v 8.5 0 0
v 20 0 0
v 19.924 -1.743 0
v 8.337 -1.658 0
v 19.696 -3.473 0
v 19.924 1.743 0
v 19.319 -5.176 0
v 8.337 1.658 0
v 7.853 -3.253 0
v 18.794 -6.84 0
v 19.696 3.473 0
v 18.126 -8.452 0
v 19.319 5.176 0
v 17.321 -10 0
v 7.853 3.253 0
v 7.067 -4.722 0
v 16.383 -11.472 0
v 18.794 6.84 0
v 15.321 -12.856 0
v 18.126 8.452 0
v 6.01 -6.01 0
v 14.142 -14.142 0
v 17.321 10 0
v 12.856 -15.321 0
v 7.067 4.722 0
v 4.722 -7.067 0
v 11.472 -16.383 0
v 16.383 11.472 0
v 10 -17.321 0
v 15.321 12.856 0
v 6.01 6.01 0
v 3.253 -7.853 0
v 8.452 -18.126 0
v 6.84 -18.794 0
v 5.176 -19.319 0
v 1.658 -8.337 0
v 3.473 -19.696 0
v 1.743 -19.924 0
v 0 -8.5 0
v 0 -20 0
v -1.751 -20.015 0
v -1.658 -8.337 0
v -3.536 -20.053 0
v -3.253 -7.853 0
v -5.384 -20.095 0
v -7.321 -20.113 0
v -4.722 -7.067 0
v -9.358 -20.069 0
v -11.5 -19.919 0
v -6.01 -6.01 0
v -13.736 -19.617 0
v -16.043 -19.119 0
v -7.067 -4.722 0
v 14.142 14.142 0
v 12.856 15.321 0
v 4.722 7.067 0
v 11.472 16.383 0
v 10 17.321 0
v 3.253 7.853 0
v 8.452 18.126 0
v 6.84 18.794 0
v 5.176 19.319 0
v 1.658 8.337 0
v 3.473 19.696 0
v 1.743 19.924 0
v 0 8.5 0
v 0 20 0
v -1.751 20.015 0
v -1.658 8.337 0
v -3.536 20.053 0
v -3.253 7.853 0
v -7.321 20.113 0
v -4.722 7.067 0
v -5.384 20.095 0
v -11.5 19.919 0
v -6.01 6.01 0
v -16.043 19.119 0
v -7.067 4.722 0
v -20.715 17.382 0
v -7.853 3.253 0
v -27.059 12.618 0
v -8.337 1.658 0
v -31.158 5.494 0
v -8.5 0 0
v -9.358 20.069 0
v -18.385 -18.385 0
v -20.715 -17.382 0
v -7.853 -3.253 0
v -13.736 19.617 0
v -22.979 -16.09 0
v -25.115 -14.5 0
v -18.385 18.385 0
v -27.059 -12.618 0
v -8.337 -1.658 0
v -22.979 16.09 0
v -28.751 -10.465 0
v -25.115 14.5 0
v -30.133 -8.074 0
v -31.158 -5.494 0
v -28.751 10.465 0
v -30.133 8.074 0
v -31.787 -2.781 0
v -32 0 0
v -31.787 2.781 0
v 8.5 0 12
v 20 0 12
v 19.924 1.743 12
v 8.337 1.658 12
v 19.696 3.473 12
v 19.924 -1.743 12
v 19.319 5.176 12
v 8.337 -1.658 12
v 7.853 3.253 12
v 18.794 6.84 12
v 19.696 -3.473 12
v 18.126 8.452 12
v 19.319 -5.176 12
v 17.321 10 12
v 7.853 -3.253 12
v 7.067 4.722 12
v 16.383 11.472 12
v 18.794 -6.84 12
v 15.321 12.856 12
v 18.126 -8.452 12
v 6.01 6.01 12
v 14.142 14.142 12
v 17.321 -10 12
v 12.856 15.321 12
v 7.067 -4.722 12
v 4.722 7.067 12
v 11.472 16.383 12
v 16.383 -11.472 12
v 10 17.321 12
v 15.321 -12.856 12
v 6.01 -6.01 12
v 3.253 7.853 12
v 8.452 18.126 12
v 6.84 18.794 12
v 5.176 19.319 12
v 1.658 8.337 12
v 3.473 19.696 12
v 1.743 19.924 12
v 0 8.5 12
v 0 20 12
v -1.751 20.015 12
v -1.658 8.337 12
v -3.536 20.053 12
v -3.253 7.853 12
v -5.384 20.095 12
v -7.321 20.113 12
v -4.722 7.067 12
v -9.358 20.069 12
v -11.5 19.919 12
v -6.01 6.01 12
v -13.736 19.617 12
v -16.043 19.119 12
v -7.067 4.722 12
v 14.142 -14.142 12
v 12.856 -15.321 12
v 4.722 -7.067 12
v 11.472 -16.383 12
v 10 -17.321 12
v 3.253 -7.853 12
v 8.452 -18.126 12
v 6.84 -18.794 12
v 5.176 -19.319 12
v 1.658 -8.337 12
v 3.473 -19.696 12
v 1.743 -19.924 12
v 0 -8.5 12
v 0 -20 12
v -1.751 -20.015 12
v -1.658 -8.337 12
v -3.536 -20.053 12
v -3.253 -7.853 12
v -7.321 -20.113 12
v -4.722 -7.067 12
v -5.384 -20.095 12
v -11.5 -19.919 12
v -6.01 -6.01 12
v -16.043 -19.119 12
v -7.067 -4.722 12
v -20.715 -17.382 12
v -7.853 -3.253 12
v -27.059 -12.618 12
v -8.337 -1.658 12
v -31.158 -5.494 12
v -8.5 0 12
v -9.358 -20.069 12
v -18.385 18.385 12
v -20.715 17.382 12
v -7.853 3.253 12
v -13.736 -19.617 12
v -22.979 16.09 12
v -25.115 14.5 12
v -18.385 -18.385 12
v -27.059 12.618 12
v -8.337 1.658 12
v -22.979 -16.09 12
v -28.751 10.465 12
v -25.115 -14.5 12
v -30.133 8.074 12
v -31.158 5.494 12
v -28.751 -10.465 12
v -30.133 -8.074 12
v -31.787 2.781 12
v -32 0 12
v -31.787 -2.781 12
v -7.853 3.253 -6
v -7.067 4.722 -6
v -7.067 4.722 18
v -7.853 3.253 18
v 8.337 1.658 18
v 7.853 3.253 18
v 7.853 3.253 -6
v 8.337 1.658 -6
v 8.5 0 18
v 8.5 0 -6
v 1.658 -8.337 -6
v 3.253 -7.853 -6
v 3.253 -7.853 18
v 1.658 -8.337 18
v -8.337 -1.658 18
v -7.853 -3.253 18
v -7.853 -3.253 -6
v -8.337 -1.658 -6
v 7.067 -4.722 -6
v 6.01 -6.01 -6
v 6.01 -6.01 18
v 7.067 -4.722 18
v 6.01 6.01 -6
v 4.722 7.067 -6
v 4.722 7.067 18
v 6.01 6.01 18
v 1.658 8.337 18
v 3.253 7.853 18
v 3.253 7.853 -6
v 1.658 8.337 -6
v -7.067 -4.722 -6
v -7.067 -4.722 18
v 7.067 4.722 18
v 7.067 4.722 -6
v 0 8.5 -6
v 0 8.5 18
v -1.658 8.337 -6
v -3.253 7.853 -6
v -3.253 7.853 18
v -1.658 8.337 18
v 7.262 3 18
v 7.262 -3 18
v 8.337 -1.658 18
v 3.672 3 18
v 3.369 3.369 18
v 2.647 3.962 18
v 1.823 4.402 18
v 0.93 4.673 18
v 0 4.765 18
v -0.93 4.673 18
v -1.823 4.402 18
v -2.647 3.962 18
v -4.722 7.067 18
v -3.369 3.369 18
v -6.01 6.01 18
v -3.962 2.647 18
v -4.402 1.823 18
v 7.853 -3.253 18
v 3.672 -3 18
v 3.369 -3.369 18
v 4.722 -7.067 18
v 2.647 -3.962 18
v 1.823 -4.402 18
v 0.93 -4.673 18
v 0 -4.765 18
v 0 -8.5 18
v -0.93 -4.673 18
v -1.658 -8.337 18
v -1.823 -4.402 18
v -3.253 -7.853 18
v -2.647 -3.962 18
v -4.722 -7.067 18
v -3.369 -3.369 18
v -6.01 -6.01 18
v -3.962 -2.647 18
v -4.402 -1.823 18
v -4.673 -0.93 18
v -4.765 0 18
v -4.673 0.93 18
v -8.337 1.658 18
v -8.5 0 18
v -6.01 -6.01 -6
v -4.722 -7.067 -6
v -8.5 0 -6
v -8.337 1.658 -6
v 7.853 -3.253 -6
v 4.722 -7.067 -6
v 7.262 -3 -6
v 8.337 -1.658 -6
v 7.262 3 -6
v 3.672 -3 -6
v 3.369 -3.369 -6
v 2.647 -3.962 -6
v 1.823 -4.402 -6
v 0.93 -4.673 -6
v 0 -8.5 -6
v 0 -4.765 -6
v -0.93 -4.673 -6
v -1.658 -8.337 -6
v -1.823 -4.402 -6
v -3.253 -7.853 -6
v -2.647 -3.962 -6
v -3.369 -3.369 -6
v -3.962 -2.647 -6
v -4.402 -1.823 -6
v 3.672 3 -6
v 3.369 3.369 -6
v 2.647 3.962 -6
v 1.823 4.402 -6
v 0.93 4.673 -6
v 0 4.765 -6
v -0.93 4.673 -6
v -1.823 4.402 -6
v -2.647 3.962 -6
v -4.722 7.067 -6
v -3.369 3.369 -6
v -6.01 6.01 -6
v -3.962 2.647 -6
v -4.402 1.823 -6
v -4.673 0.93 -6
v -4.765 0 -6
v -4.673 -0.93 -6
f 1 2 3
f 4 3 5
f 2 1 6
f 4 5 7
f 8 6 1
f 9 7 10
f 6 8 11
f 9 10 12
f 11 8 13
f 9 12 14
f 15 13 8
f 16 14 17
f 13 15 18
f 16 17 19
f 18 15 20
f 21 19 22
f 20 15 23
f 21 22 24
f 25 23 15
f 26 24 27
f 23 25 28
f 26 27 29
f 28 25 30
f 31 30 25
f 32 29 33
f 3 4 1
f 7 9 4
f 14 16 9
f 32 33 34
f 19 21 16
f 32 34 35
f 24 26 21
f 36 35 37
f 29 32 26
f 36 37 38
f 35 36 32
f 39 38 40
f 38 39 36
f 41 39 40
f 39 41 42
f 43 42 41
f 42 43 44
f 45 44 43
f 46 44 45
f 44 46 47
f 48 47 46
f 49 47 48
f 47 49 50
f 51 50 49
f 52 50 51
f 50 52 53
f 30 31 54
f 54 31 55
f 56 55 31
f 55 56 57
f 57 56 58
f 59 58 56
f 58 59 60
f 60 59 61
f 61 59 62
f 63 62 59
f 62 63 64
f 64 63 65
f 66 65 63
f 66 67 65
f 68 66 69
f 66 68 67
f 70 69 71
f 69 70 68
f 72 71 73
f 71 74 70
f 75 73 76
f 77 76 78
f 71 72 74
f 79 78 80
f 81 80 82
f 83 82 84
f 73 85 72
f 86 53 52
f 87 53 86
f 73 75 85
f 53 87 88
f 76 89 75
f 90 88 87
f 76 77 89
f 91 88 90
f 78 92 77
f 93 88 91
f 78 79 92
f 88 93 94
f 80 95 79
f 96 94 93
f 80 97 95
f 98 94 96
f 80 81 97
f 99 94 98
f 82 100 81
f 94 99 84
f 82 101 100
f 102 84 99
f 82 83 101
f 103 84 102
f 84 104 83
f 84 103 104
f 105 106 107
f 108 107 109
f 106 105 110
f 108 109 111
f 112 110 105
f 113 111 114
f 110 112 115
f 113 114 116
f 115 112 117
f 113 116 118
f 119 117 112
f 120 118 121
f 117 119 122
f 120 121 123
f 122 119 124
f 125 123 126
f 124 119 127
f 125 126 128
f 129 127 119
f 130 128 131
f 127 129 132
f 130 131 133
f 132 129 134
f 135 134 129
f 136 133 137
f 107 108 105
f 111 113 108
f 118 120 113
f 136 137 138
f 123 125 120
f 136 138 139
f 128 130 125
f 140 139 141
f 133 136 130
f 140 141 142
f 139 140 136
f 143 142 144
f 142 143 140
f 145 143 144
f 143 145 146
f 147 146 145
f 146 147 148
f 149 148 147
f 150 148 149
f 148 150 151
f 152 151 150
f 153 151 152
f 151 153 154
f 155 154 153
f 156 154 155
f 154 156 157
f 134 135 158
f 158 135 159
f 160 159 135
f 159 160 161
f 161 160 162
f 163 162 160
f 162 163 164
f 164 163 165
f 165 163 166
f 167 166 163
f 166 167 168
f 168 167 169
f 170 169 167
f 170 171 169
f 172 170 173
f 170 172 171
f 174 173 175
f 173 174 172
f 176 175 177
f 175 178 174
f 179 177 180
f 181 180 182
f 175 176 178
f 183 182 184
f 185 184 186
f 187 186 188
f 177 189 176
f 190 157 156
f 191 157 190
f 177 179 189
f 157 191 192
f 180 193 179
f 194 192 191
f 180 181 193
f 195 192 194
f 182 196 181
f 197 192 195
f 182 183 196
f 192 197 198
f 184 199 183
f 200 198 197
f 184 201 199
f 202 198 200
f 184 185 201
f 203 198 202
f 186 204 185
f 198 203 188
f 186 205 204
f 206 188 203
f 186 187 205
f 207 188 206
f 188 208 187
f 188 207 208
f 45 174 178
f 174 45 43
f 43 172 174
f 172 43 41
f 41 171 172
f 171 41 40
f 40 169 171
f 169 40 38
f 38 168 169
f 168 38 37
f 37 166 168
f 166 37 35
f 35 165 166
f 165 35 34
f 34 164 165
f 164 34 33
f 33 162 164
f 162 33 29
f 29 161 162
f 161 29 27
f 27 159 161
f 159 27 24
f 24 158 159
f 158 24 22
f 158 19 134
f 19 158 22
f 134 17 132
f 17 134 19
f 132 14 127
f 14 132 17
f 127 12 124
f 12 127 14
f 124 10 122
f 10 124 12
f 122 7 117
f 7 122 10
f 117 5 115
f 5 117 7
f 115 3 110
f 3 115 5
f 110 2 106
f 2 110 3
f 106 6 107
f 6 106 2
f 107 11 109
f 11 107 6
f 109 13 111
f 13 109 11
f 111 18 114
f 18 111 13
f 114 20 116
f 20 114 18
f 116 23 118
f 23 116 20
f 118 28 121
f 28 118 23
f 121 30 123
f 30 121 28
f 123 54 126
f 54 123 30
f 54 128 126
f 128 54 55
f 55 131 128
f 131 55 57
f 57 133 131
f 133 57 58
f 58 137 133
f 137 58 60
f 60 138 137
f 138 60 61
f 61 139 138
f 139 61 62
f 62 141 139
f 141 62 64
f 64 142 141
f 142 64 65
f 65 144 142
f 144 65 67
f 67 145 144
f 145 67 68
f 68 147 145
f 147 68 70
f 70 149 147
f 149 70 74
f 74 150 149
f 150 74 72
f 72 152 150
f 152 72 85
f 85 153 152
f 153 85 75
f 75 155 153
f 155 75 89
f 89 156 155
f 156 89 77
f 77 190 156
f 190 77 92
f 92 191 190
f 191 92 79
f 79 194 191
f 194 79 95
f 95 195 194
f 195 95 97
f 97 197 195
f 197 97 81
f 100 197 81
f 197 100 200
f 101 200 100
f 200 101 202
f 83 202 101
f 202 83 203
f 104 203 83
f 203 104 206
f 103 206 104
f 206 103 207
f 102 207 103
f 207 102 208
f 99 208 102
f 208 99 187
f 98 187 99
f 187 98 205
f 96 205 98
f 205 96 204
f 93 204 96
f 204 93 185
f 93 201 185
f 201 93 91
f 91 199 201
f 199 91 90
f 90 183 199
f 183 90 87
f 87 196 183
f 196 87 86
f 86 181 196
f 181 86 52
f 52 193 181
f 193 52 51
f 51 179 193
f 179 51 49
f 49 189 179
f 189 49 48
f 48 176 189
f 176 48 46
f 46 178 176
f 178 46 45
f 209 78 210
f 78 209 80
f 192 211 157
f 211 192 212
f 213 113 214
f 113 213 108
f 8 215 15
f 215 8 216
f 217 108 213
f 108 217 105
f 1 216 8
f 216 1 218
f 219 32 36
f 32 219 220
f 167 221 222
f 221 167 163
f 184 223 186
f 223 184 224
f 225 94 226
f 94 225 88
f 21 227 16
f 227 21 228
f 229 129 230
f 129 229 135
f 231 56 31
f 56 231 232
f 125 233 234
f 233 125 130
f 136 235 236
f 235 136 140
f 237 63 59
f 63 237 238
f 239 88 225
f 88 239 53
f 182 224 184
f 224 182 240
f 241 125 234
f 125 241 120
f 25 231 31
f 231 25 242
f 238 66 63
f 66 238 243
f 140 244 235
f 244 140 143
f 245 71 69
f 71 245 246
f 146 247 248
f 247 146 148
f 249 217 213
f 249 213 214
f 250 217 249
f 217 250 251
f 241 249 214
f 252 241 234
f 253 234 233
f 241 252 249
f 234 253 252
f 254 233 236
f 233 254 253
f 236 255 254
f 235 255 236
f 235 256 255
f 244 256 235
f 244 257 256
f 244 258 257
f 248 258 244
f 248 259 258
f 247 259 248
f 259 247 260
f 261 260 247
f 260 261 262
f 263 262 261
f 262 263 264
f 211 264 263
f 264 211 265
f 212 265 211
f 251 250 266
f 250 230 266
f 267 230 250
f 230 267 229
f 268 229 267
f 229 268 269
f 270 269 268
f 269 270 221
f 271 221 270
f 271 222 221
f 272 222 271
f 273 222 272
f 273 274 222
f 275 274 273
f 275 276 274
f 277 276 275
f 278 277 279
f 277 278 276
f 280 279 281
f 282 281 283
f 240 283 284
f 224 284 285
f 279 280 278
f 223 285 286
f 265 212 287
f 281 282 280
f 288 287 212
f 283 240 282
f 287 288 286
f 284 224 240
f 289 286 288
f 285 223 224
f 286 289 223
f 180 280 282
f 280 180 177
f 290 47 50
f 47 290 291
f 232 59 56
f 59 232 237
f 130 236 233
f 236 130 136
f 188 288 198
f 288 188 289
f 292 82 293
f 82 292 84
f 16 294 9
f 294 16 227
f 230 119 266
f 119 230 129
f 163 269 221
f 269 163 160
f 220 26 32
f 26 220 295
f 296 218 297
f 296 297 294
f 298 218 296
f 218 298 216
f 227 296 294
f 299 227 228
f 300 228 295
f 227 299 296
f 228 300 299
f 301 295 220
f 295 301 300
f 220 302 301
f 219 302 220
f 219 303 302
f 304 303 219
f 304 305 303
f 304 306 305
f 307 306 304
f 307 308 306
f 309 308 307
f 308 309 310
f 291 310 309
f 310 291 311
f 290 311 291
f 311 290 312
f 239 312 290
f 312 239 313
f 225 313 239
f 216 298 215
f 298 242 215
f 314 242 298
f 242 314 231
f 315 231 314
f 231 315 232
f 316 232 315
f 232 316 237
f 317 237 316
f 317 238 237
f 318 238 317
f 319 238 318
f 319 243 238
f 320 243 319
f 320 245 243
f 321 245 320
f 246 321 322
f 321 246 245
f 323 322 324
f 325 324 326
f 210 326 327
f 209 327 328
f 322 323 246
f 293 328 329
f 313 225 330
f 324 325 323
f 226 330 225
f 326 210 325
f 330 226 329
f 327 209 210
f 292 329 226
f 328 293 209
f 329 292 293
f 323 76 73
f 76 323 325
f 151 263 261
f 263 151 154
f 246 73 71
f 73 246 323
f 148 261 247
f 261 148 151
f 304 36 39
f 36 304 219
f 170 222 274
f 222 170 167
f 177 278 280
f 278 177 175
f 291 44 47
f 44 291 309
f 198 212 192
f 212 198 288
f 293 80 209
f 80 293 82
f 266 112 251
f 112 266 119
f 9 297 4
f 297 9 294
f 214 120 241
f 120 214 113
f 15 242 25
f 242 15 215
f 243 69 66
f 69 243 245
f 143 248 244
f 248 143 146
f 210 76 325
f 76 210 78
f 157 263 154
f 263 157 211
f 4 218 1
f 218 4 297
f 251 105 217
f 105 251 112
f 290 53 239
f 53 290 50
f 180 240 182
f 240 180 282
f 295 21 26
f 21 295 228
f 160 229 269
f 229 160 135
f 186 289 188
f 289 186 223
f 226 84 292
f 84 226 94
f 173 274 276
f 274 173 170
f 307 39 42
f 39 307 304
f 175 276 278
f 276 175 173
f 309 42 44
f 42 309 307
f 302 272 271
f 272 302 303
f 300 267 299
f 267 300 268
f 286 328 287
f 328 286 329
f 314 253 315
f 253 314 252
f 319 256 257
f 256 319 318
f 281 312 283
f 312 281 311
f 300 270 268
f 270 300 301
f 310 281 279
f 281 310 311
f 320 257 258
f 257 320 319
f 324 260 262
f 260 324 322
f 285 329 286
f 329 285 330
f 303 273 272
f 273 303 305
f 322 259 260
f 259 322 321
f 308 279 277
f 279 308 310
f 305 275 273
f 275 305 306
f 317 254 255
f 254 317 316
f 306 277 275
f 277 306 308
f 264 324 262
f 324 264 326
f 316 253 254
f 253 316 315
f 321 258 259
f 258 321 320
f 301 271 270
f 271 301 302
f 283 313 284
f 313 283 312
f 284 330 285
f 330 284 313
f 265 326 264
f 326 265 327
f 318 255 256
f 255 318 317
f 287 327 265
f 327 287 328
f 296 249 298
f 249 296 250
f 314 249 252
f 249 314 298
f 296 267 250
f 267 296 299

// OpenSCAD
$fn = 32;

// ----------------------------------------------------------------------
// Cam: base radius 20 mm with a 12 mm lift over 180 degrees
// ----------------------------------------------------------------------

// --- parameters (mm) ---
base_r = 20;              // base radius
lift = 12;                // lift height above the base radius
lift_span = 180;          // angular width of the lift
lift_start = 90;          // angle where the lift starts
cam_t = 12;               // cam plate thickness
hub_d = 17;               // hub diameter
hub_h = 24;               // hub height
bore_d = 9.53;            // bore
key_w = 6;                // keyway width
key_depth = 1.74;         // keyway depth

cam_profile = [[20, 0], [19.924, 1.743], [19.696, 3.473], [19.319, 5.176], [18.794, 6.84], [18.126, 8.452], [17.321, 10], [16.383, 11.472], [15.321, 12.856], [14.142, 14.142], [12.856, 15.321], [11.472, 16.383], [10, 17.321], [8.452, 18.126], [6.84, 18.794], [5.176, 19.319], [3.473, 19.696], [1.743, 19.924], [0, 20], [-1.751, 20.015], [-3.536, 20.053], [-5.384, 20.095], [-7.321, 20.113], [-9.358, 20.069], [-11.5, 19.919], [-13.736, 19.617], [-16.043, 19.119], [-18.385, 18.385], [-20.715, 17.382], [-22.979, 16.09], [-25.115, 14.5], [-27.059, 12.618], [-28.751, 10.465], [-30.133, 8.074], [-31.158, 5.494], [-31.787, 2.781], [-32, 0], [-31.787, -2.781], [-31.158, -5.494], [-30.133, -8.074], [-28.751, -10.465], [-27.059, -12.618], [-25.115, -14.5], [-22.979, -16.09], [-20.715, -17.382], [-18.385, -18.385], [-16.043, -19.119], [-13.736, -19.617], [-11.5, -19.919], [-9.358, -20.069], [-7.321, -20.113], [-5.384, -20.095], [-3.536, -20.053], [-1.751, -20.015], [0, -20], [1.743, -19.924], [3.473, -19.696], [5.176, -19.319], [6.84, -18.794], [8.452, -18.126], [10, -17.321], [11.472, -16.383], [12.856, -15.321], [14.142, -14.142], [15.321, -12.856], [16.383, -11.472], [17.321, -10], [18.126, -8.452], [18.794, -6.84], [19.319, -5.176], [19.696, -3.473], [19.924, -1.743]];

difference() {
  union() {
    linear_extrude(height = cam_t) polygon(cam_profile);
    /* hub, proud of the cam plate on both sides */
    translate([0, 0, -6]) cylinder(h = hub_h, d = hub_d);
  }
  /* bore through the hub, 2.5 mm clear on both faces */
  translate([0, 0, -8.5]) cylinder(h = hub_h + 5, d = bore_d);
  /* keyway, milled through the whole hub */
  translate([3.022, -3, -8.5]) cube([4.24, 6, 29]);
}
